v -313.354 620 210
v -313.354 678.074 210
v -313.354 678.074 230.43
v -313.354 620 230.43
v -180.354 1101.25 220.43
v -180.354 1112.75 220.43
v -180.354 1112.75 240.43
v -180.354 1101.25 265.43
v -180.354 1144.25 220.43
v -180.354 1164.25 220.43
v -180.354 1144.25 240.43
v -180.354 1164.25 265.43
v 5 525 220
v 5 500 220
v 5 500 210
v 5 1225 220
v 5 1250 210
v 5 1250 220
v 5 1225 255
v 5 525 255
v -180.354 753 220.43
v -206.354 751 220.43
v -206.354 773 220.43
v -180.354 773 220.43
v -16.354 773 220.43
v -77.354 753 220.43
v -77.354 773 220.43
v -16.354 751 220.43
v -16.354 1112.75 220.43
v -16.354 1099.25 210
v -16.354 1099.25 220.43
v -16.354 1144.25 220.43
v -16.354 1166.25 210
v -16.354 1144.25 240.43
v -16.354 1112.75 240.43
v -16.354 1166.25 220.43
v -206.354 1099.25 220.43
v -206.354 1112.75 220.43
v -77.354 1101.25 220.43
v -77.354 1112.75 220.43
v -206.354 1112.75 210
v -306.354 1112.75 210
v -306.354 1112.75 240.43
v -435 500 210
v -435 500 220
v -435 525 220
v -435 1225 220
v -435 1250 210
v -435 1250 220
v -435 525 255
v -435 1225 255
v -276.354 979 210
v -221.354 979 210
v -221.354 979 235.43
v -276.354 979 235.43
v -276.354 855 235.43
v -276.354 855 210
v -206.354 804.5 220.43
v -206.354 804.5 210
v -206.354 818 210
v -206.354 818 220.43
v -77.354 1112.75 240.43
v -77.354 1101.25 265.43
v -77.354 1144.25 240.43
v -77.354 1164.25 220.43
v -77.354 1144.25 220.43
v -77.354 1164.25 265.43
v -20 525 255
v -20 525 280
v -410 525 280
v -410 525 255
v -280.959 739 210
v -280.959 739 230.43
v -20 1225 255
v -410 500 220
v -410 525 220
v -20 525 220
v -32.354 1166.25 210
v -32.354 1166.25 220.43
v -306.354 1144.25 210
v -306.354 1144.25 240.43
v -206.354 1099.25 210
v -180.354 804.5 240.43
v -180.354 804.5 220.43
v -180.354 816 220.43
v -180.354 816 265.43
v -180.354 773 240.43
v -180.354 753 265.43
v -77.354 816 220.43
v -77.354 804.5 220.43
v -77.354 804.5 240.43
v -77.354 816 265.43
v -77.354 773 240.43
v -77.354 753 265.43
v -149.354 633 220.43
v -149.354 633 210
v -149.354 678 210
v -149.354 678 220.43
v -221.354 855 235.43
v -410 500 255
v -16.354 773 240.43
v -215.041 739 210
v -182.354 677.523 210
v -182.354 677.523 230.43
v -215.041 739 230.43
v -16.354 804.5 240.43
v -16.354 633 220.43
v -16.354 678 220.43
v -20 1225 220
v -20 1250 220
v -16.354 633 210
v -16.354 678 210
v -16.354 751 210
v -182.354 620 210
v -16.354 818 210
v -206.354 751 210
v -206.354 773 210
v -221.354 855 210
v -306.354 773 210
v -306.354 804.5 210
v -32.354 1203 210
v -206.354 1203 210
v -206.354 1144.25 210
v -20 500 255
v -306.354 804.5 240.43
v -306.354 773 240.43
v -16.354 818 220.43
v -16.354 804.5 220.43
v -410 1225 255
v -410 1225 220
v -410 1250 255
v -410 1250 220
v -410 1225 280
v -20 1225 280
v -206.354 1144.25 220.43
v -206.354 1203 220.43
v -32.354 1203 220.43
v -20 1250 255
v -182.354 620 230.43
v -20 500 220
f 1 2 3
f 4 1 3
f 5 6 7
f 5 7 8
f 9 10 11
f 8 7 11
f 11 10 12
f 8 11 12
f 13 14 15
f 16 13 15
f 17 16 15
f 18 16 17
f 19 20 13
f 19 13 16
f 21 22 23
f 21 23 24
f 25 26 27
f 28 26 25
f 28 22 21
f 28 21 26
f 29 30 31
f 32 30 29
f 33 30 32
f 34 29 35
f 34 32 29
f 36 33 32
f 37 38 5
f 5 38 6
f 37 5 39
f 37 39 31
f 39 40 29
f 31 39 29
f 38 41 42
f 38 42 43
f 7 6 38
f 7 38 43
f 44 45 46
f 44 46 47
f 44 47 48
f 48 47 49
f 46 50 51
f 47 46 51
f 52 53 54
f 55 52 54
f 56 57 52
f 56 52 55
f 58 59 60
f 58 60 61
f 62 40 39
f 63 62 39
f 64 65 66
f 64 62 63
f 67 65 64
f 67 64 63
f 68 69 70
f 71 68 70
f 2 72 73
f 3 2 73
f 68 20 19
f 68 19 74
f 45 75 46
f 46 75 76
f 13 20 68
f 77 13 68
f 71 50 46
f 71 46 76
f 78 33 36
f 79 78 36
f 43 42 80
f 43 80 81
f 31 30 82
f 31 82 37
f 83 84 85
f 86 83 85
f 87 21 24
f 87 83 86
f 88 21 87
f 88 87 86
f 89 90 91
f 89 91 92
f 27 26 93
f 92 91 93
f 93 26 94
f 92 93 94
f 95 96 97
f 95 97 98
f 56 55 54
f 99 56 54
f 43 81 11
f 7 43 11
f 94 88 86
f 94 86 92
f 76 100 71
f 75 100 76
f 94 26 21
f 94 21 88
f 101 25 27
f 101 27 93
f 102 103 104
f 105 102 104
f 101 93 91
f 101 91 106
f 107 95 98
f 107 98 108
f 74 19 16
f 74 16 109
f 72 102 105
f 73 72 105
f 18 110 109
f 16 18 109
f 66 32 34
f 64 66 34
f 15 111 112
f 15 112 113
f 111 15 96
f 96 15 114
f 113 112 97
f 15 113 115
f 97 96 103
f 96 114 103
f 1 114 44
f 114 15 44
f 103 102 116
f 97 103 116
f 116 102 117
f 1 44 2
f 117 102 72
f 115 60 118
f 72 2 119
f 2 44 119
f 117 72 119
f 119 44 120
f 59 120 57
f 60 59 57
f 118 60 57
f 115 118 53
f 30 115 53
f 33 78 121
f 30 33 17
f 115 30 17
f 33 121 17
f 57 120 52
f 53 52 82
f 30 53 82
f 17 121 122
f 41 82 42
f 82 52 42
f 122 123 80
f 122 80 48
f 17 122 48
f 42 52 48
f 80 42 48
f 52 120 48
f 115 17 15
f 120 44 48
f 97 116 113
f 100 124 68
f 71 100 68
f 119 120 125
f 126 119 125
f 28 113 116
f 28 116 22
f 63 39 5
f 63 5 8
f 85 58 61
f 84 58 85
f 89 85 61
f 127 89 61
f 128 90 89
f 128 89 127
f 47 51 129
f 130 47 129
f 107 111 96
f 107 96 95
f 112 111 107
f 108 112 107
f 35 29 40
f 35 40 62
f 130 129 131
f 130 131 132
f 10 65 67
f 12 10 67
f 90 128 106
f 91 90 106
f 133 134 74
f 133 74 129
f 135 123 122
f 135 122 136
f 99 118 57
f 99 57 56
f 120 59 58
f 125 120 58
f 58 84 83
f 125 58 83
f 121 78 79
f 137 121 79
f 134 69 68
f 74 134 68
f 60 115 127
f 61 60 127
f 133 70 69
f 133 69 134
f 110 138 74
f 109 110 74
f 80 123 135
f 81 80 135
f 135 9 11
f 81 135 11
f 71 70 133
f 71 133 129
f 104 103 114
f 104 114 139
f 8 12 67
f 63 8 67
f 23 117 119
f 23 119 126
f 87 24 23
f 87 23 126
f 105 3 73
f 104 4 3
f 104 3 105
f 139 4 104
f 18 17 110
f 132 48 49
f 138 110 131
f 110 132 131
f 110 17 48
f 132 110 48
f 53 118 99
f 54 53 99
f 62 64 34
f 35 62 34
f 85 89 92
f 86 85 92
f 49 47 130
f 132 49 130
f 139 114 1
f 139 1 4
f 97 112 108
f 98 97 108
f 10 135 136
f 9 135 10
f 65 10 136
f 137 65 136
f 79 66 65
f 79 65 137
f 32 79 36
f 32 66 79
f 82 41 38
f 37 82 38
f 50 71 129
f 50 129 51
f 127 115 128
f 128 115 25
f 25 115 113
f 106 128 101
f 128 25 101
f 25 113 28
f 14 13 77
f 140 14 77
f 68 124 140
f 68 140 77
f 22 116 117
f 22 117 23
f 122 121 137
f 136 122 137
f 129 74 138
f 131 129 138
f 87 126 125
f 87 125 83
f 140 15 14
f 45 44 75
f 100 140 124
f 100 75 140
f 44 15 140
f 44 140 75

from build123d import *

# Parameters (mm, degrees)
BOX160_W                  = 26
BOX160_H                  = 26
BOX160_DEPTH              = 61
BOX161_W                  = 26
BOX161_H                  = 26
BOX161_DEPTH              = 61
BOX162_W                  = 26
BOX162_H                  = 26
BOX162_DEPTH              = 61
BOX163_W                  = 26
BOX163_H                  = 26
BOX163_DEPTH              = 61
BOX164_W                  = 26
BOX164_H                  = 26
BOX164_DEPTH              = 442
BOX165_W                  = 26
BOX165_H                  = 26
BOX165_DEPTH              = 442
BOX166_W                  = 26
BOX166_H                  = 26
BOX166_DEPTH              = 752
BOX167_W                  = 26
BOX167_H                  = 26
BOX167_DEPTH              = 752
FUSION056_PLACEMENT_ANGLE = 180
BOX129_W                  = 247
BOX129_H                  = 133
BOX129_DEPTH              = 45
BOX123_W                  = 205
BOX123_H                  = 131
BOX123_DEPTH              = 119
BOX123_ROLL_ANGLE         = 118
BOX123_PLACEMENT_ANGLE    = 180
BOX122_W                  = 187
BOX122_H                  = 131
BOX122_DEPTH              = 119
BOX099_W                  = 222
BOX099_H                  = 190
BOX099_DEPTH              = 67
BOX100_W                  = 247
BOX100_H                  = 290
BOX100_DEPTH              = 31.5
BOX098_W                  = 267
BOX098_H                  = 103
BOX098_DEPTH              = 63
BOX128_W                  = 222
BOX128_H                  = 174
BOX128_DEPTH              = 55
BOX114_W                  = 222
BOX114_H                  = 190
BOX114_DEPTH              = 67
BOX115_W                  = 247
BOX115_H                  = 290
BOX115_DEPTH              = 31.5
BOX113_W                  = 267
BOX113_H                  = 103
BOX113_DEPTH              = 63
BOX120_W                  = 237
BOX120_H                  = 55
BOX120_DEPTH              = 124
BOX130_W                  = 750
BOX130_H                  = 70
BOX130_DEPTH              = 440
CUT025_PLACEMENT_ANGLE    = 90


with BuildPart() as cube120:
    # Box160 → Box160 (new body)
    with BuildSketch(Plane(origin=(238, -256, -232), x_dir=(0, 0, 1), z_dir=(-1, 0, 0))):
        with Locations((13, 13)):
            Rectangle(BOX160_W, BOX160_H)
    extrude(amount=BOX160_DEPTH)


with BuildPart() as cube121:
    # Box161 → Box161 (new body)
    with BuildSketch(Plane(origin=(238, -256, 210), x_dir=(0, 1, 0), z_dir=(-1, 0, 0))):
        with Locations((13, 13)):
            Rectangle(BOX161_W, BOX161_H)
    extrude(amount=BOX161_DEPTH)


with BuildPart() as cube122:
    # Box162 → Box162 (new body)
    with BuildSketch(Plane(origin=(238, 496, -232), x_dir=(0, -1, 0), z_dir=(-1, 0, 0))):
        with Locations((13, 13)):
            Rectangle(BOX162_W, BOX162_H)
    extrude(amount=BOX162_DEPTH)


with BuildPart() as cube123:
    # Box163 → Box163 (new body)
    with BuildSketch(Plane(origin=(238, 496, 210), x_dir=(0, 0, -1), z_dir=(-1, 0, 0))):
        with Locations((13, 13)):
            Rectangle(BOX163_W, BOX163_H)
    extrude(amount=BOX163_DEPTH)


with BuildPart() as cube124:
    # Box164 → Box164 (new body)
    with BuildSketch(Plane(origin=(238, 496, 210), x_dir=(0, -1, 0), z_dir=(0, 0, -1))):
        with Locations((13, 13)):
            Rectangle(BOX164_W, BOX164_H)
    extrude(amount=BOX164_DEPTH)


with BuildPart() as cube125:
    # Box165 → Box165 (new body)
    with BuildSketch(Plane(origin=(238, -230, 210), x_dir=(0, -1, 0), z_dir=(0, 0, -1))):
        with Locations((13, 13)):
            Rectangle(BOX165_W, BOX165_H)
    extrude(amount=BOX165_DEPTH)


with BuildPart() as cube126:
    # Box166 → Box166 (new body)
    with BuildSketch(Plane(origin=(238, 496, 210), x_dir=(-1, 0, 0), z_dir=(0, -1, 0))):
        with Locations((13, 13)):
            Rectangle(BOX166_W, BOX166_H)
    extrude(amount=BOX166_DEPTH)


with BuildPart() as supportbeams001:
    # Box167 → Box167 (new body)
    with BuildSketch(Plane(origin=(238, 496, -206), x_dir=(-1, 0, 0), z_dir=(0, -1, 0))):
        with Locations((13, 13)):
            Rectangle(BOX167_W, BOX167_H)
    extrude(amount=BOX167_DEPTH)

    # Fusion056: union Cube120, Cube121, Cube122, Cube123, Cube124, Cube125, Cube126
    add(cube120.part)
    add(cube121.part)
    add(cube122.part)
    add(cube123.part)
    add(cube124.part)
    add(cube125.part)
    add(cube126.part)


with BuildPart() as supportbeams001_1:
    # Fusion056 placement: moved
    add(supportbeams001.part.moved(Location((172, 240, 0))).rotate(Axis((172, 240, 0), (0, 0, 1)), FUSION056_PLACEMENT_ANGLE))


with BuildPart() as f_120_envelope007:
    # Box129 → Box129 (new body)
    with BuildSketch(Plane(origin=(241.570357, -122, 54.646476), x_dir=(-1, 0, 0), z_dir=(0, 1, 0))):
        with Locations((123.5, 66.5)):
            Rectangle(BOX129_W, BOX129_H)
    extrude(amount=BOX129_DEPTH)


with BuildPart() as pocket009:
    # Box123 → Box123 (new body)
    with BuildSketch(Plane.XY):
        with Locations((102.5, 65.5)):
            Rectangle(BOX123_W, BOX123_H)
    extrude(amount=BOX123_DEPTH)


with BuildPart() as pocket009_1:
    # Box123 roll: moved
    add(pocket009.part.rotate(Axis((0, 0, 0), (1, 0, 0)), BOX123_ROLL_ANGLE))


with BuildPart() as pocket009_2:
    # Box123 placement: moved
    add(pocket009_1.part.moved(Location((141.57, -85, 25.646476))).rotate(Axis((141.57, -85, 25.646476), (0, 0, 1)), BOX123_PLACEMENT_ANGLE))


with BuildPart() as compound014:
    # Part__Mirroring003: instance of pocket009
    add(pocket009_2.part.mirror(Plane(origin=(0, 0, 0), x_dir=(0, 1, 0), z_dir=(0, 0, 1))))


with BuildPart() as compound014_1:
    # Compound014 placement: moved
    add(compound014.part.moved(Location((0, 0, -88))))


with BuildPart() as fusion043:
    # Fusion043 base: copy of pocket009
    add(pocket009_2.part)

    # Fusion043: union Compound014
    add(compound014_1.part)


with BuildPart() as prism002:
    # Box122 → Box122 (new body)
    with BuildSketch(Plane(origin=(136.57, -135, -109.353524), x_dir=(-1, 0, 0), z_dir=(0, 1, 0))):
        with Locations((93.5, 65.5)):
            Rectangle(BOX122_W, BOX122_H)
    extrude(amount=BOX122_DEPTH)

    # Cut020: cut Fusion043
    add(fusion043.part, mode=Mode.SUBTRACT)


with BuildPart() as prism002_1:
    # Cut020 placement: moved
    add(prism002.part.moved(Location((35, 0, 0))))


with BuildPart() as cube073:
    # Box099 → Box099 (new body)
    with BuildSketch(Plane(origin=(216.570357, -4, -2.353524), x_dir=(-1, 0, 0), z_dir=(0, 1, 0))):
        with Locations((111, 95)):
            Rectangle(BOX099_W, BOX099_H)
    extrude(amount=BOX099_DEPTH)


with BuildPart() as cube074:
    # Box100 → Box100 (new body)
    with BuildSketch(Plane(origin=(221.570357, 18, -102.353524), x_dir=(-1, 0, 0), z_dir=(0, 1, 0))):
        with Locations((123.5, 145)):
            Rectangle(BOX100_W, BOX100_H)
    extrude(amount=BOX100_DEPTH)


with BuildPart() as standard_envelope002:
    # Box098 → Box098 (new body)
    with BuildSketch(Plane(origin=(216.570357, -2, 23.646476), x_dir=(-1, 0, 0), z_dir=(0, 1, 0))):
        with Locations((133.5, 51.5)):
            Rectangle(BOX098_W, BOX098_H)
    extrude(amount=BOX098_DEPTH)

    # Fusion036: union Cube073, Cube074
    add(cube073.part)
    add(cube074.part)


with BuildPart() as mattglass_envelope001:
    # Box128 → Box128 (new body)
    with BuildSketch(Plane(origin=(216.570357, 393, -2.353524), x_dir=(-1, 0, 0), z_dir=(0, 1, 0))):
        with Locations((111, 87)):
            Rectangle(BOX128_W, BOX128_H)
    extrude(amount=BOX128_DEPTH)


with BuildPart() as cube088:
    # Box114 → Box114 (new body)
    with BuildSketch(Plane(origin=(216.570357, -4, -2.353524), x_dir=(-1, 0, 0), z_dir=(0, 1, 0))):
        with Locations((111, 95)):
            Rectangle(BOX114_W, BOX114_H)
    extrude(amount=BOX114_DEPTH)


with BuildPart() as cube089:
    # Box115 → Box115 (new body)
    with BuildSketch(Plane(origin=(221.570357, 18, -102.353524), x_dir=(-1, 0, 0), z_dir=(0, 1, 0))):
        with Locations((123.5, 145)):
            Rectangle(BOX115_W, BOX115_H)
    extrude(amount=BOX115_DEPTH)


with BuildPart() as standard_envelope003:
    # Box113 → Box113 (new body)
    with BuildSketch(Plane(origin=(216.570357, -2, 23.646476), x_dir=(-1, 0, 0), z_dir=(0, 1, 0))):
        with Locations((133.5, 51.5)):
            Rectangle(BOX113_W, BOX113_H)
    extrude(amount=BOX113_DEPTH)

    # Fusion042: union Cube088, Cube089
    add(cube088.part)
    add(cube089.part)


with BuildPart() as fusion053:
    # Part__Mirroring002: instance of Standard envelope003
    add(standard_envelope003.part.mirror(Plane(origin=(0, 0, 0), x_dir=(1, 0, 0), z_dir=(0, 1, 0))))


with BuildPart() as fusion053_1:
    # Part__Mirroring002 placement: moved
    add(fusion053.part.moved(Location((0, 407.25, 0))))

    # Fusion053: union mattglass envelope001
    add(mattglass_envelope001.part)


with BuildPart() as fusion054:
    # Box120 → Box120 (new body)
    with BuildSketch(Plane(origin=(216.570357, 100, -72.353524), x_dir=(-1, 0, 0), z_dir=(0, 1, 0))):
        with Locations((118.5, 27.5)):
            Rectangle(BOX120_W, BOX120_H)
    extrude(amount=BOX120_DEPTH)

    # Fusion054: union 120 envelope007, prism002, Standard envelope002, Fusion053
    add(f_120_envelope007.part)
    add(prism002_1.part)
    add(standard_envelope002.part)
    add(fusion053_1.part)


with BuildPart() as cut025:
    # Box130 → Box130 (new body)
    with BuildSketch(Plane(origin=(5, -255, -231), x_dir=(0, 1, 0), z_dir=(0, 0, 1))):
        with Locations((375, 35)):
            Rectangle(BOX130_W, BOX130_H)
    extrude(amount=BOX130_DEPTH)

    # Cut024: cut Fusion054
    add(fusion054.part, mode=Mode.SUBTRACT)

    # Cut025: cut Supportbeams001
    add(supportbeams001_1.part, mode=Mode.SUBTRACT)


with BuildPart() as cut025_1:
    # Cut025 placement: moved
    add(cut025.part.moved(Location((-204, 755, 215))).rotate(Axis((-204, 755, 215), (0, 1, 0)), CUT025_PLACEMENT_ANGLE))


solid = cut025_1.part
